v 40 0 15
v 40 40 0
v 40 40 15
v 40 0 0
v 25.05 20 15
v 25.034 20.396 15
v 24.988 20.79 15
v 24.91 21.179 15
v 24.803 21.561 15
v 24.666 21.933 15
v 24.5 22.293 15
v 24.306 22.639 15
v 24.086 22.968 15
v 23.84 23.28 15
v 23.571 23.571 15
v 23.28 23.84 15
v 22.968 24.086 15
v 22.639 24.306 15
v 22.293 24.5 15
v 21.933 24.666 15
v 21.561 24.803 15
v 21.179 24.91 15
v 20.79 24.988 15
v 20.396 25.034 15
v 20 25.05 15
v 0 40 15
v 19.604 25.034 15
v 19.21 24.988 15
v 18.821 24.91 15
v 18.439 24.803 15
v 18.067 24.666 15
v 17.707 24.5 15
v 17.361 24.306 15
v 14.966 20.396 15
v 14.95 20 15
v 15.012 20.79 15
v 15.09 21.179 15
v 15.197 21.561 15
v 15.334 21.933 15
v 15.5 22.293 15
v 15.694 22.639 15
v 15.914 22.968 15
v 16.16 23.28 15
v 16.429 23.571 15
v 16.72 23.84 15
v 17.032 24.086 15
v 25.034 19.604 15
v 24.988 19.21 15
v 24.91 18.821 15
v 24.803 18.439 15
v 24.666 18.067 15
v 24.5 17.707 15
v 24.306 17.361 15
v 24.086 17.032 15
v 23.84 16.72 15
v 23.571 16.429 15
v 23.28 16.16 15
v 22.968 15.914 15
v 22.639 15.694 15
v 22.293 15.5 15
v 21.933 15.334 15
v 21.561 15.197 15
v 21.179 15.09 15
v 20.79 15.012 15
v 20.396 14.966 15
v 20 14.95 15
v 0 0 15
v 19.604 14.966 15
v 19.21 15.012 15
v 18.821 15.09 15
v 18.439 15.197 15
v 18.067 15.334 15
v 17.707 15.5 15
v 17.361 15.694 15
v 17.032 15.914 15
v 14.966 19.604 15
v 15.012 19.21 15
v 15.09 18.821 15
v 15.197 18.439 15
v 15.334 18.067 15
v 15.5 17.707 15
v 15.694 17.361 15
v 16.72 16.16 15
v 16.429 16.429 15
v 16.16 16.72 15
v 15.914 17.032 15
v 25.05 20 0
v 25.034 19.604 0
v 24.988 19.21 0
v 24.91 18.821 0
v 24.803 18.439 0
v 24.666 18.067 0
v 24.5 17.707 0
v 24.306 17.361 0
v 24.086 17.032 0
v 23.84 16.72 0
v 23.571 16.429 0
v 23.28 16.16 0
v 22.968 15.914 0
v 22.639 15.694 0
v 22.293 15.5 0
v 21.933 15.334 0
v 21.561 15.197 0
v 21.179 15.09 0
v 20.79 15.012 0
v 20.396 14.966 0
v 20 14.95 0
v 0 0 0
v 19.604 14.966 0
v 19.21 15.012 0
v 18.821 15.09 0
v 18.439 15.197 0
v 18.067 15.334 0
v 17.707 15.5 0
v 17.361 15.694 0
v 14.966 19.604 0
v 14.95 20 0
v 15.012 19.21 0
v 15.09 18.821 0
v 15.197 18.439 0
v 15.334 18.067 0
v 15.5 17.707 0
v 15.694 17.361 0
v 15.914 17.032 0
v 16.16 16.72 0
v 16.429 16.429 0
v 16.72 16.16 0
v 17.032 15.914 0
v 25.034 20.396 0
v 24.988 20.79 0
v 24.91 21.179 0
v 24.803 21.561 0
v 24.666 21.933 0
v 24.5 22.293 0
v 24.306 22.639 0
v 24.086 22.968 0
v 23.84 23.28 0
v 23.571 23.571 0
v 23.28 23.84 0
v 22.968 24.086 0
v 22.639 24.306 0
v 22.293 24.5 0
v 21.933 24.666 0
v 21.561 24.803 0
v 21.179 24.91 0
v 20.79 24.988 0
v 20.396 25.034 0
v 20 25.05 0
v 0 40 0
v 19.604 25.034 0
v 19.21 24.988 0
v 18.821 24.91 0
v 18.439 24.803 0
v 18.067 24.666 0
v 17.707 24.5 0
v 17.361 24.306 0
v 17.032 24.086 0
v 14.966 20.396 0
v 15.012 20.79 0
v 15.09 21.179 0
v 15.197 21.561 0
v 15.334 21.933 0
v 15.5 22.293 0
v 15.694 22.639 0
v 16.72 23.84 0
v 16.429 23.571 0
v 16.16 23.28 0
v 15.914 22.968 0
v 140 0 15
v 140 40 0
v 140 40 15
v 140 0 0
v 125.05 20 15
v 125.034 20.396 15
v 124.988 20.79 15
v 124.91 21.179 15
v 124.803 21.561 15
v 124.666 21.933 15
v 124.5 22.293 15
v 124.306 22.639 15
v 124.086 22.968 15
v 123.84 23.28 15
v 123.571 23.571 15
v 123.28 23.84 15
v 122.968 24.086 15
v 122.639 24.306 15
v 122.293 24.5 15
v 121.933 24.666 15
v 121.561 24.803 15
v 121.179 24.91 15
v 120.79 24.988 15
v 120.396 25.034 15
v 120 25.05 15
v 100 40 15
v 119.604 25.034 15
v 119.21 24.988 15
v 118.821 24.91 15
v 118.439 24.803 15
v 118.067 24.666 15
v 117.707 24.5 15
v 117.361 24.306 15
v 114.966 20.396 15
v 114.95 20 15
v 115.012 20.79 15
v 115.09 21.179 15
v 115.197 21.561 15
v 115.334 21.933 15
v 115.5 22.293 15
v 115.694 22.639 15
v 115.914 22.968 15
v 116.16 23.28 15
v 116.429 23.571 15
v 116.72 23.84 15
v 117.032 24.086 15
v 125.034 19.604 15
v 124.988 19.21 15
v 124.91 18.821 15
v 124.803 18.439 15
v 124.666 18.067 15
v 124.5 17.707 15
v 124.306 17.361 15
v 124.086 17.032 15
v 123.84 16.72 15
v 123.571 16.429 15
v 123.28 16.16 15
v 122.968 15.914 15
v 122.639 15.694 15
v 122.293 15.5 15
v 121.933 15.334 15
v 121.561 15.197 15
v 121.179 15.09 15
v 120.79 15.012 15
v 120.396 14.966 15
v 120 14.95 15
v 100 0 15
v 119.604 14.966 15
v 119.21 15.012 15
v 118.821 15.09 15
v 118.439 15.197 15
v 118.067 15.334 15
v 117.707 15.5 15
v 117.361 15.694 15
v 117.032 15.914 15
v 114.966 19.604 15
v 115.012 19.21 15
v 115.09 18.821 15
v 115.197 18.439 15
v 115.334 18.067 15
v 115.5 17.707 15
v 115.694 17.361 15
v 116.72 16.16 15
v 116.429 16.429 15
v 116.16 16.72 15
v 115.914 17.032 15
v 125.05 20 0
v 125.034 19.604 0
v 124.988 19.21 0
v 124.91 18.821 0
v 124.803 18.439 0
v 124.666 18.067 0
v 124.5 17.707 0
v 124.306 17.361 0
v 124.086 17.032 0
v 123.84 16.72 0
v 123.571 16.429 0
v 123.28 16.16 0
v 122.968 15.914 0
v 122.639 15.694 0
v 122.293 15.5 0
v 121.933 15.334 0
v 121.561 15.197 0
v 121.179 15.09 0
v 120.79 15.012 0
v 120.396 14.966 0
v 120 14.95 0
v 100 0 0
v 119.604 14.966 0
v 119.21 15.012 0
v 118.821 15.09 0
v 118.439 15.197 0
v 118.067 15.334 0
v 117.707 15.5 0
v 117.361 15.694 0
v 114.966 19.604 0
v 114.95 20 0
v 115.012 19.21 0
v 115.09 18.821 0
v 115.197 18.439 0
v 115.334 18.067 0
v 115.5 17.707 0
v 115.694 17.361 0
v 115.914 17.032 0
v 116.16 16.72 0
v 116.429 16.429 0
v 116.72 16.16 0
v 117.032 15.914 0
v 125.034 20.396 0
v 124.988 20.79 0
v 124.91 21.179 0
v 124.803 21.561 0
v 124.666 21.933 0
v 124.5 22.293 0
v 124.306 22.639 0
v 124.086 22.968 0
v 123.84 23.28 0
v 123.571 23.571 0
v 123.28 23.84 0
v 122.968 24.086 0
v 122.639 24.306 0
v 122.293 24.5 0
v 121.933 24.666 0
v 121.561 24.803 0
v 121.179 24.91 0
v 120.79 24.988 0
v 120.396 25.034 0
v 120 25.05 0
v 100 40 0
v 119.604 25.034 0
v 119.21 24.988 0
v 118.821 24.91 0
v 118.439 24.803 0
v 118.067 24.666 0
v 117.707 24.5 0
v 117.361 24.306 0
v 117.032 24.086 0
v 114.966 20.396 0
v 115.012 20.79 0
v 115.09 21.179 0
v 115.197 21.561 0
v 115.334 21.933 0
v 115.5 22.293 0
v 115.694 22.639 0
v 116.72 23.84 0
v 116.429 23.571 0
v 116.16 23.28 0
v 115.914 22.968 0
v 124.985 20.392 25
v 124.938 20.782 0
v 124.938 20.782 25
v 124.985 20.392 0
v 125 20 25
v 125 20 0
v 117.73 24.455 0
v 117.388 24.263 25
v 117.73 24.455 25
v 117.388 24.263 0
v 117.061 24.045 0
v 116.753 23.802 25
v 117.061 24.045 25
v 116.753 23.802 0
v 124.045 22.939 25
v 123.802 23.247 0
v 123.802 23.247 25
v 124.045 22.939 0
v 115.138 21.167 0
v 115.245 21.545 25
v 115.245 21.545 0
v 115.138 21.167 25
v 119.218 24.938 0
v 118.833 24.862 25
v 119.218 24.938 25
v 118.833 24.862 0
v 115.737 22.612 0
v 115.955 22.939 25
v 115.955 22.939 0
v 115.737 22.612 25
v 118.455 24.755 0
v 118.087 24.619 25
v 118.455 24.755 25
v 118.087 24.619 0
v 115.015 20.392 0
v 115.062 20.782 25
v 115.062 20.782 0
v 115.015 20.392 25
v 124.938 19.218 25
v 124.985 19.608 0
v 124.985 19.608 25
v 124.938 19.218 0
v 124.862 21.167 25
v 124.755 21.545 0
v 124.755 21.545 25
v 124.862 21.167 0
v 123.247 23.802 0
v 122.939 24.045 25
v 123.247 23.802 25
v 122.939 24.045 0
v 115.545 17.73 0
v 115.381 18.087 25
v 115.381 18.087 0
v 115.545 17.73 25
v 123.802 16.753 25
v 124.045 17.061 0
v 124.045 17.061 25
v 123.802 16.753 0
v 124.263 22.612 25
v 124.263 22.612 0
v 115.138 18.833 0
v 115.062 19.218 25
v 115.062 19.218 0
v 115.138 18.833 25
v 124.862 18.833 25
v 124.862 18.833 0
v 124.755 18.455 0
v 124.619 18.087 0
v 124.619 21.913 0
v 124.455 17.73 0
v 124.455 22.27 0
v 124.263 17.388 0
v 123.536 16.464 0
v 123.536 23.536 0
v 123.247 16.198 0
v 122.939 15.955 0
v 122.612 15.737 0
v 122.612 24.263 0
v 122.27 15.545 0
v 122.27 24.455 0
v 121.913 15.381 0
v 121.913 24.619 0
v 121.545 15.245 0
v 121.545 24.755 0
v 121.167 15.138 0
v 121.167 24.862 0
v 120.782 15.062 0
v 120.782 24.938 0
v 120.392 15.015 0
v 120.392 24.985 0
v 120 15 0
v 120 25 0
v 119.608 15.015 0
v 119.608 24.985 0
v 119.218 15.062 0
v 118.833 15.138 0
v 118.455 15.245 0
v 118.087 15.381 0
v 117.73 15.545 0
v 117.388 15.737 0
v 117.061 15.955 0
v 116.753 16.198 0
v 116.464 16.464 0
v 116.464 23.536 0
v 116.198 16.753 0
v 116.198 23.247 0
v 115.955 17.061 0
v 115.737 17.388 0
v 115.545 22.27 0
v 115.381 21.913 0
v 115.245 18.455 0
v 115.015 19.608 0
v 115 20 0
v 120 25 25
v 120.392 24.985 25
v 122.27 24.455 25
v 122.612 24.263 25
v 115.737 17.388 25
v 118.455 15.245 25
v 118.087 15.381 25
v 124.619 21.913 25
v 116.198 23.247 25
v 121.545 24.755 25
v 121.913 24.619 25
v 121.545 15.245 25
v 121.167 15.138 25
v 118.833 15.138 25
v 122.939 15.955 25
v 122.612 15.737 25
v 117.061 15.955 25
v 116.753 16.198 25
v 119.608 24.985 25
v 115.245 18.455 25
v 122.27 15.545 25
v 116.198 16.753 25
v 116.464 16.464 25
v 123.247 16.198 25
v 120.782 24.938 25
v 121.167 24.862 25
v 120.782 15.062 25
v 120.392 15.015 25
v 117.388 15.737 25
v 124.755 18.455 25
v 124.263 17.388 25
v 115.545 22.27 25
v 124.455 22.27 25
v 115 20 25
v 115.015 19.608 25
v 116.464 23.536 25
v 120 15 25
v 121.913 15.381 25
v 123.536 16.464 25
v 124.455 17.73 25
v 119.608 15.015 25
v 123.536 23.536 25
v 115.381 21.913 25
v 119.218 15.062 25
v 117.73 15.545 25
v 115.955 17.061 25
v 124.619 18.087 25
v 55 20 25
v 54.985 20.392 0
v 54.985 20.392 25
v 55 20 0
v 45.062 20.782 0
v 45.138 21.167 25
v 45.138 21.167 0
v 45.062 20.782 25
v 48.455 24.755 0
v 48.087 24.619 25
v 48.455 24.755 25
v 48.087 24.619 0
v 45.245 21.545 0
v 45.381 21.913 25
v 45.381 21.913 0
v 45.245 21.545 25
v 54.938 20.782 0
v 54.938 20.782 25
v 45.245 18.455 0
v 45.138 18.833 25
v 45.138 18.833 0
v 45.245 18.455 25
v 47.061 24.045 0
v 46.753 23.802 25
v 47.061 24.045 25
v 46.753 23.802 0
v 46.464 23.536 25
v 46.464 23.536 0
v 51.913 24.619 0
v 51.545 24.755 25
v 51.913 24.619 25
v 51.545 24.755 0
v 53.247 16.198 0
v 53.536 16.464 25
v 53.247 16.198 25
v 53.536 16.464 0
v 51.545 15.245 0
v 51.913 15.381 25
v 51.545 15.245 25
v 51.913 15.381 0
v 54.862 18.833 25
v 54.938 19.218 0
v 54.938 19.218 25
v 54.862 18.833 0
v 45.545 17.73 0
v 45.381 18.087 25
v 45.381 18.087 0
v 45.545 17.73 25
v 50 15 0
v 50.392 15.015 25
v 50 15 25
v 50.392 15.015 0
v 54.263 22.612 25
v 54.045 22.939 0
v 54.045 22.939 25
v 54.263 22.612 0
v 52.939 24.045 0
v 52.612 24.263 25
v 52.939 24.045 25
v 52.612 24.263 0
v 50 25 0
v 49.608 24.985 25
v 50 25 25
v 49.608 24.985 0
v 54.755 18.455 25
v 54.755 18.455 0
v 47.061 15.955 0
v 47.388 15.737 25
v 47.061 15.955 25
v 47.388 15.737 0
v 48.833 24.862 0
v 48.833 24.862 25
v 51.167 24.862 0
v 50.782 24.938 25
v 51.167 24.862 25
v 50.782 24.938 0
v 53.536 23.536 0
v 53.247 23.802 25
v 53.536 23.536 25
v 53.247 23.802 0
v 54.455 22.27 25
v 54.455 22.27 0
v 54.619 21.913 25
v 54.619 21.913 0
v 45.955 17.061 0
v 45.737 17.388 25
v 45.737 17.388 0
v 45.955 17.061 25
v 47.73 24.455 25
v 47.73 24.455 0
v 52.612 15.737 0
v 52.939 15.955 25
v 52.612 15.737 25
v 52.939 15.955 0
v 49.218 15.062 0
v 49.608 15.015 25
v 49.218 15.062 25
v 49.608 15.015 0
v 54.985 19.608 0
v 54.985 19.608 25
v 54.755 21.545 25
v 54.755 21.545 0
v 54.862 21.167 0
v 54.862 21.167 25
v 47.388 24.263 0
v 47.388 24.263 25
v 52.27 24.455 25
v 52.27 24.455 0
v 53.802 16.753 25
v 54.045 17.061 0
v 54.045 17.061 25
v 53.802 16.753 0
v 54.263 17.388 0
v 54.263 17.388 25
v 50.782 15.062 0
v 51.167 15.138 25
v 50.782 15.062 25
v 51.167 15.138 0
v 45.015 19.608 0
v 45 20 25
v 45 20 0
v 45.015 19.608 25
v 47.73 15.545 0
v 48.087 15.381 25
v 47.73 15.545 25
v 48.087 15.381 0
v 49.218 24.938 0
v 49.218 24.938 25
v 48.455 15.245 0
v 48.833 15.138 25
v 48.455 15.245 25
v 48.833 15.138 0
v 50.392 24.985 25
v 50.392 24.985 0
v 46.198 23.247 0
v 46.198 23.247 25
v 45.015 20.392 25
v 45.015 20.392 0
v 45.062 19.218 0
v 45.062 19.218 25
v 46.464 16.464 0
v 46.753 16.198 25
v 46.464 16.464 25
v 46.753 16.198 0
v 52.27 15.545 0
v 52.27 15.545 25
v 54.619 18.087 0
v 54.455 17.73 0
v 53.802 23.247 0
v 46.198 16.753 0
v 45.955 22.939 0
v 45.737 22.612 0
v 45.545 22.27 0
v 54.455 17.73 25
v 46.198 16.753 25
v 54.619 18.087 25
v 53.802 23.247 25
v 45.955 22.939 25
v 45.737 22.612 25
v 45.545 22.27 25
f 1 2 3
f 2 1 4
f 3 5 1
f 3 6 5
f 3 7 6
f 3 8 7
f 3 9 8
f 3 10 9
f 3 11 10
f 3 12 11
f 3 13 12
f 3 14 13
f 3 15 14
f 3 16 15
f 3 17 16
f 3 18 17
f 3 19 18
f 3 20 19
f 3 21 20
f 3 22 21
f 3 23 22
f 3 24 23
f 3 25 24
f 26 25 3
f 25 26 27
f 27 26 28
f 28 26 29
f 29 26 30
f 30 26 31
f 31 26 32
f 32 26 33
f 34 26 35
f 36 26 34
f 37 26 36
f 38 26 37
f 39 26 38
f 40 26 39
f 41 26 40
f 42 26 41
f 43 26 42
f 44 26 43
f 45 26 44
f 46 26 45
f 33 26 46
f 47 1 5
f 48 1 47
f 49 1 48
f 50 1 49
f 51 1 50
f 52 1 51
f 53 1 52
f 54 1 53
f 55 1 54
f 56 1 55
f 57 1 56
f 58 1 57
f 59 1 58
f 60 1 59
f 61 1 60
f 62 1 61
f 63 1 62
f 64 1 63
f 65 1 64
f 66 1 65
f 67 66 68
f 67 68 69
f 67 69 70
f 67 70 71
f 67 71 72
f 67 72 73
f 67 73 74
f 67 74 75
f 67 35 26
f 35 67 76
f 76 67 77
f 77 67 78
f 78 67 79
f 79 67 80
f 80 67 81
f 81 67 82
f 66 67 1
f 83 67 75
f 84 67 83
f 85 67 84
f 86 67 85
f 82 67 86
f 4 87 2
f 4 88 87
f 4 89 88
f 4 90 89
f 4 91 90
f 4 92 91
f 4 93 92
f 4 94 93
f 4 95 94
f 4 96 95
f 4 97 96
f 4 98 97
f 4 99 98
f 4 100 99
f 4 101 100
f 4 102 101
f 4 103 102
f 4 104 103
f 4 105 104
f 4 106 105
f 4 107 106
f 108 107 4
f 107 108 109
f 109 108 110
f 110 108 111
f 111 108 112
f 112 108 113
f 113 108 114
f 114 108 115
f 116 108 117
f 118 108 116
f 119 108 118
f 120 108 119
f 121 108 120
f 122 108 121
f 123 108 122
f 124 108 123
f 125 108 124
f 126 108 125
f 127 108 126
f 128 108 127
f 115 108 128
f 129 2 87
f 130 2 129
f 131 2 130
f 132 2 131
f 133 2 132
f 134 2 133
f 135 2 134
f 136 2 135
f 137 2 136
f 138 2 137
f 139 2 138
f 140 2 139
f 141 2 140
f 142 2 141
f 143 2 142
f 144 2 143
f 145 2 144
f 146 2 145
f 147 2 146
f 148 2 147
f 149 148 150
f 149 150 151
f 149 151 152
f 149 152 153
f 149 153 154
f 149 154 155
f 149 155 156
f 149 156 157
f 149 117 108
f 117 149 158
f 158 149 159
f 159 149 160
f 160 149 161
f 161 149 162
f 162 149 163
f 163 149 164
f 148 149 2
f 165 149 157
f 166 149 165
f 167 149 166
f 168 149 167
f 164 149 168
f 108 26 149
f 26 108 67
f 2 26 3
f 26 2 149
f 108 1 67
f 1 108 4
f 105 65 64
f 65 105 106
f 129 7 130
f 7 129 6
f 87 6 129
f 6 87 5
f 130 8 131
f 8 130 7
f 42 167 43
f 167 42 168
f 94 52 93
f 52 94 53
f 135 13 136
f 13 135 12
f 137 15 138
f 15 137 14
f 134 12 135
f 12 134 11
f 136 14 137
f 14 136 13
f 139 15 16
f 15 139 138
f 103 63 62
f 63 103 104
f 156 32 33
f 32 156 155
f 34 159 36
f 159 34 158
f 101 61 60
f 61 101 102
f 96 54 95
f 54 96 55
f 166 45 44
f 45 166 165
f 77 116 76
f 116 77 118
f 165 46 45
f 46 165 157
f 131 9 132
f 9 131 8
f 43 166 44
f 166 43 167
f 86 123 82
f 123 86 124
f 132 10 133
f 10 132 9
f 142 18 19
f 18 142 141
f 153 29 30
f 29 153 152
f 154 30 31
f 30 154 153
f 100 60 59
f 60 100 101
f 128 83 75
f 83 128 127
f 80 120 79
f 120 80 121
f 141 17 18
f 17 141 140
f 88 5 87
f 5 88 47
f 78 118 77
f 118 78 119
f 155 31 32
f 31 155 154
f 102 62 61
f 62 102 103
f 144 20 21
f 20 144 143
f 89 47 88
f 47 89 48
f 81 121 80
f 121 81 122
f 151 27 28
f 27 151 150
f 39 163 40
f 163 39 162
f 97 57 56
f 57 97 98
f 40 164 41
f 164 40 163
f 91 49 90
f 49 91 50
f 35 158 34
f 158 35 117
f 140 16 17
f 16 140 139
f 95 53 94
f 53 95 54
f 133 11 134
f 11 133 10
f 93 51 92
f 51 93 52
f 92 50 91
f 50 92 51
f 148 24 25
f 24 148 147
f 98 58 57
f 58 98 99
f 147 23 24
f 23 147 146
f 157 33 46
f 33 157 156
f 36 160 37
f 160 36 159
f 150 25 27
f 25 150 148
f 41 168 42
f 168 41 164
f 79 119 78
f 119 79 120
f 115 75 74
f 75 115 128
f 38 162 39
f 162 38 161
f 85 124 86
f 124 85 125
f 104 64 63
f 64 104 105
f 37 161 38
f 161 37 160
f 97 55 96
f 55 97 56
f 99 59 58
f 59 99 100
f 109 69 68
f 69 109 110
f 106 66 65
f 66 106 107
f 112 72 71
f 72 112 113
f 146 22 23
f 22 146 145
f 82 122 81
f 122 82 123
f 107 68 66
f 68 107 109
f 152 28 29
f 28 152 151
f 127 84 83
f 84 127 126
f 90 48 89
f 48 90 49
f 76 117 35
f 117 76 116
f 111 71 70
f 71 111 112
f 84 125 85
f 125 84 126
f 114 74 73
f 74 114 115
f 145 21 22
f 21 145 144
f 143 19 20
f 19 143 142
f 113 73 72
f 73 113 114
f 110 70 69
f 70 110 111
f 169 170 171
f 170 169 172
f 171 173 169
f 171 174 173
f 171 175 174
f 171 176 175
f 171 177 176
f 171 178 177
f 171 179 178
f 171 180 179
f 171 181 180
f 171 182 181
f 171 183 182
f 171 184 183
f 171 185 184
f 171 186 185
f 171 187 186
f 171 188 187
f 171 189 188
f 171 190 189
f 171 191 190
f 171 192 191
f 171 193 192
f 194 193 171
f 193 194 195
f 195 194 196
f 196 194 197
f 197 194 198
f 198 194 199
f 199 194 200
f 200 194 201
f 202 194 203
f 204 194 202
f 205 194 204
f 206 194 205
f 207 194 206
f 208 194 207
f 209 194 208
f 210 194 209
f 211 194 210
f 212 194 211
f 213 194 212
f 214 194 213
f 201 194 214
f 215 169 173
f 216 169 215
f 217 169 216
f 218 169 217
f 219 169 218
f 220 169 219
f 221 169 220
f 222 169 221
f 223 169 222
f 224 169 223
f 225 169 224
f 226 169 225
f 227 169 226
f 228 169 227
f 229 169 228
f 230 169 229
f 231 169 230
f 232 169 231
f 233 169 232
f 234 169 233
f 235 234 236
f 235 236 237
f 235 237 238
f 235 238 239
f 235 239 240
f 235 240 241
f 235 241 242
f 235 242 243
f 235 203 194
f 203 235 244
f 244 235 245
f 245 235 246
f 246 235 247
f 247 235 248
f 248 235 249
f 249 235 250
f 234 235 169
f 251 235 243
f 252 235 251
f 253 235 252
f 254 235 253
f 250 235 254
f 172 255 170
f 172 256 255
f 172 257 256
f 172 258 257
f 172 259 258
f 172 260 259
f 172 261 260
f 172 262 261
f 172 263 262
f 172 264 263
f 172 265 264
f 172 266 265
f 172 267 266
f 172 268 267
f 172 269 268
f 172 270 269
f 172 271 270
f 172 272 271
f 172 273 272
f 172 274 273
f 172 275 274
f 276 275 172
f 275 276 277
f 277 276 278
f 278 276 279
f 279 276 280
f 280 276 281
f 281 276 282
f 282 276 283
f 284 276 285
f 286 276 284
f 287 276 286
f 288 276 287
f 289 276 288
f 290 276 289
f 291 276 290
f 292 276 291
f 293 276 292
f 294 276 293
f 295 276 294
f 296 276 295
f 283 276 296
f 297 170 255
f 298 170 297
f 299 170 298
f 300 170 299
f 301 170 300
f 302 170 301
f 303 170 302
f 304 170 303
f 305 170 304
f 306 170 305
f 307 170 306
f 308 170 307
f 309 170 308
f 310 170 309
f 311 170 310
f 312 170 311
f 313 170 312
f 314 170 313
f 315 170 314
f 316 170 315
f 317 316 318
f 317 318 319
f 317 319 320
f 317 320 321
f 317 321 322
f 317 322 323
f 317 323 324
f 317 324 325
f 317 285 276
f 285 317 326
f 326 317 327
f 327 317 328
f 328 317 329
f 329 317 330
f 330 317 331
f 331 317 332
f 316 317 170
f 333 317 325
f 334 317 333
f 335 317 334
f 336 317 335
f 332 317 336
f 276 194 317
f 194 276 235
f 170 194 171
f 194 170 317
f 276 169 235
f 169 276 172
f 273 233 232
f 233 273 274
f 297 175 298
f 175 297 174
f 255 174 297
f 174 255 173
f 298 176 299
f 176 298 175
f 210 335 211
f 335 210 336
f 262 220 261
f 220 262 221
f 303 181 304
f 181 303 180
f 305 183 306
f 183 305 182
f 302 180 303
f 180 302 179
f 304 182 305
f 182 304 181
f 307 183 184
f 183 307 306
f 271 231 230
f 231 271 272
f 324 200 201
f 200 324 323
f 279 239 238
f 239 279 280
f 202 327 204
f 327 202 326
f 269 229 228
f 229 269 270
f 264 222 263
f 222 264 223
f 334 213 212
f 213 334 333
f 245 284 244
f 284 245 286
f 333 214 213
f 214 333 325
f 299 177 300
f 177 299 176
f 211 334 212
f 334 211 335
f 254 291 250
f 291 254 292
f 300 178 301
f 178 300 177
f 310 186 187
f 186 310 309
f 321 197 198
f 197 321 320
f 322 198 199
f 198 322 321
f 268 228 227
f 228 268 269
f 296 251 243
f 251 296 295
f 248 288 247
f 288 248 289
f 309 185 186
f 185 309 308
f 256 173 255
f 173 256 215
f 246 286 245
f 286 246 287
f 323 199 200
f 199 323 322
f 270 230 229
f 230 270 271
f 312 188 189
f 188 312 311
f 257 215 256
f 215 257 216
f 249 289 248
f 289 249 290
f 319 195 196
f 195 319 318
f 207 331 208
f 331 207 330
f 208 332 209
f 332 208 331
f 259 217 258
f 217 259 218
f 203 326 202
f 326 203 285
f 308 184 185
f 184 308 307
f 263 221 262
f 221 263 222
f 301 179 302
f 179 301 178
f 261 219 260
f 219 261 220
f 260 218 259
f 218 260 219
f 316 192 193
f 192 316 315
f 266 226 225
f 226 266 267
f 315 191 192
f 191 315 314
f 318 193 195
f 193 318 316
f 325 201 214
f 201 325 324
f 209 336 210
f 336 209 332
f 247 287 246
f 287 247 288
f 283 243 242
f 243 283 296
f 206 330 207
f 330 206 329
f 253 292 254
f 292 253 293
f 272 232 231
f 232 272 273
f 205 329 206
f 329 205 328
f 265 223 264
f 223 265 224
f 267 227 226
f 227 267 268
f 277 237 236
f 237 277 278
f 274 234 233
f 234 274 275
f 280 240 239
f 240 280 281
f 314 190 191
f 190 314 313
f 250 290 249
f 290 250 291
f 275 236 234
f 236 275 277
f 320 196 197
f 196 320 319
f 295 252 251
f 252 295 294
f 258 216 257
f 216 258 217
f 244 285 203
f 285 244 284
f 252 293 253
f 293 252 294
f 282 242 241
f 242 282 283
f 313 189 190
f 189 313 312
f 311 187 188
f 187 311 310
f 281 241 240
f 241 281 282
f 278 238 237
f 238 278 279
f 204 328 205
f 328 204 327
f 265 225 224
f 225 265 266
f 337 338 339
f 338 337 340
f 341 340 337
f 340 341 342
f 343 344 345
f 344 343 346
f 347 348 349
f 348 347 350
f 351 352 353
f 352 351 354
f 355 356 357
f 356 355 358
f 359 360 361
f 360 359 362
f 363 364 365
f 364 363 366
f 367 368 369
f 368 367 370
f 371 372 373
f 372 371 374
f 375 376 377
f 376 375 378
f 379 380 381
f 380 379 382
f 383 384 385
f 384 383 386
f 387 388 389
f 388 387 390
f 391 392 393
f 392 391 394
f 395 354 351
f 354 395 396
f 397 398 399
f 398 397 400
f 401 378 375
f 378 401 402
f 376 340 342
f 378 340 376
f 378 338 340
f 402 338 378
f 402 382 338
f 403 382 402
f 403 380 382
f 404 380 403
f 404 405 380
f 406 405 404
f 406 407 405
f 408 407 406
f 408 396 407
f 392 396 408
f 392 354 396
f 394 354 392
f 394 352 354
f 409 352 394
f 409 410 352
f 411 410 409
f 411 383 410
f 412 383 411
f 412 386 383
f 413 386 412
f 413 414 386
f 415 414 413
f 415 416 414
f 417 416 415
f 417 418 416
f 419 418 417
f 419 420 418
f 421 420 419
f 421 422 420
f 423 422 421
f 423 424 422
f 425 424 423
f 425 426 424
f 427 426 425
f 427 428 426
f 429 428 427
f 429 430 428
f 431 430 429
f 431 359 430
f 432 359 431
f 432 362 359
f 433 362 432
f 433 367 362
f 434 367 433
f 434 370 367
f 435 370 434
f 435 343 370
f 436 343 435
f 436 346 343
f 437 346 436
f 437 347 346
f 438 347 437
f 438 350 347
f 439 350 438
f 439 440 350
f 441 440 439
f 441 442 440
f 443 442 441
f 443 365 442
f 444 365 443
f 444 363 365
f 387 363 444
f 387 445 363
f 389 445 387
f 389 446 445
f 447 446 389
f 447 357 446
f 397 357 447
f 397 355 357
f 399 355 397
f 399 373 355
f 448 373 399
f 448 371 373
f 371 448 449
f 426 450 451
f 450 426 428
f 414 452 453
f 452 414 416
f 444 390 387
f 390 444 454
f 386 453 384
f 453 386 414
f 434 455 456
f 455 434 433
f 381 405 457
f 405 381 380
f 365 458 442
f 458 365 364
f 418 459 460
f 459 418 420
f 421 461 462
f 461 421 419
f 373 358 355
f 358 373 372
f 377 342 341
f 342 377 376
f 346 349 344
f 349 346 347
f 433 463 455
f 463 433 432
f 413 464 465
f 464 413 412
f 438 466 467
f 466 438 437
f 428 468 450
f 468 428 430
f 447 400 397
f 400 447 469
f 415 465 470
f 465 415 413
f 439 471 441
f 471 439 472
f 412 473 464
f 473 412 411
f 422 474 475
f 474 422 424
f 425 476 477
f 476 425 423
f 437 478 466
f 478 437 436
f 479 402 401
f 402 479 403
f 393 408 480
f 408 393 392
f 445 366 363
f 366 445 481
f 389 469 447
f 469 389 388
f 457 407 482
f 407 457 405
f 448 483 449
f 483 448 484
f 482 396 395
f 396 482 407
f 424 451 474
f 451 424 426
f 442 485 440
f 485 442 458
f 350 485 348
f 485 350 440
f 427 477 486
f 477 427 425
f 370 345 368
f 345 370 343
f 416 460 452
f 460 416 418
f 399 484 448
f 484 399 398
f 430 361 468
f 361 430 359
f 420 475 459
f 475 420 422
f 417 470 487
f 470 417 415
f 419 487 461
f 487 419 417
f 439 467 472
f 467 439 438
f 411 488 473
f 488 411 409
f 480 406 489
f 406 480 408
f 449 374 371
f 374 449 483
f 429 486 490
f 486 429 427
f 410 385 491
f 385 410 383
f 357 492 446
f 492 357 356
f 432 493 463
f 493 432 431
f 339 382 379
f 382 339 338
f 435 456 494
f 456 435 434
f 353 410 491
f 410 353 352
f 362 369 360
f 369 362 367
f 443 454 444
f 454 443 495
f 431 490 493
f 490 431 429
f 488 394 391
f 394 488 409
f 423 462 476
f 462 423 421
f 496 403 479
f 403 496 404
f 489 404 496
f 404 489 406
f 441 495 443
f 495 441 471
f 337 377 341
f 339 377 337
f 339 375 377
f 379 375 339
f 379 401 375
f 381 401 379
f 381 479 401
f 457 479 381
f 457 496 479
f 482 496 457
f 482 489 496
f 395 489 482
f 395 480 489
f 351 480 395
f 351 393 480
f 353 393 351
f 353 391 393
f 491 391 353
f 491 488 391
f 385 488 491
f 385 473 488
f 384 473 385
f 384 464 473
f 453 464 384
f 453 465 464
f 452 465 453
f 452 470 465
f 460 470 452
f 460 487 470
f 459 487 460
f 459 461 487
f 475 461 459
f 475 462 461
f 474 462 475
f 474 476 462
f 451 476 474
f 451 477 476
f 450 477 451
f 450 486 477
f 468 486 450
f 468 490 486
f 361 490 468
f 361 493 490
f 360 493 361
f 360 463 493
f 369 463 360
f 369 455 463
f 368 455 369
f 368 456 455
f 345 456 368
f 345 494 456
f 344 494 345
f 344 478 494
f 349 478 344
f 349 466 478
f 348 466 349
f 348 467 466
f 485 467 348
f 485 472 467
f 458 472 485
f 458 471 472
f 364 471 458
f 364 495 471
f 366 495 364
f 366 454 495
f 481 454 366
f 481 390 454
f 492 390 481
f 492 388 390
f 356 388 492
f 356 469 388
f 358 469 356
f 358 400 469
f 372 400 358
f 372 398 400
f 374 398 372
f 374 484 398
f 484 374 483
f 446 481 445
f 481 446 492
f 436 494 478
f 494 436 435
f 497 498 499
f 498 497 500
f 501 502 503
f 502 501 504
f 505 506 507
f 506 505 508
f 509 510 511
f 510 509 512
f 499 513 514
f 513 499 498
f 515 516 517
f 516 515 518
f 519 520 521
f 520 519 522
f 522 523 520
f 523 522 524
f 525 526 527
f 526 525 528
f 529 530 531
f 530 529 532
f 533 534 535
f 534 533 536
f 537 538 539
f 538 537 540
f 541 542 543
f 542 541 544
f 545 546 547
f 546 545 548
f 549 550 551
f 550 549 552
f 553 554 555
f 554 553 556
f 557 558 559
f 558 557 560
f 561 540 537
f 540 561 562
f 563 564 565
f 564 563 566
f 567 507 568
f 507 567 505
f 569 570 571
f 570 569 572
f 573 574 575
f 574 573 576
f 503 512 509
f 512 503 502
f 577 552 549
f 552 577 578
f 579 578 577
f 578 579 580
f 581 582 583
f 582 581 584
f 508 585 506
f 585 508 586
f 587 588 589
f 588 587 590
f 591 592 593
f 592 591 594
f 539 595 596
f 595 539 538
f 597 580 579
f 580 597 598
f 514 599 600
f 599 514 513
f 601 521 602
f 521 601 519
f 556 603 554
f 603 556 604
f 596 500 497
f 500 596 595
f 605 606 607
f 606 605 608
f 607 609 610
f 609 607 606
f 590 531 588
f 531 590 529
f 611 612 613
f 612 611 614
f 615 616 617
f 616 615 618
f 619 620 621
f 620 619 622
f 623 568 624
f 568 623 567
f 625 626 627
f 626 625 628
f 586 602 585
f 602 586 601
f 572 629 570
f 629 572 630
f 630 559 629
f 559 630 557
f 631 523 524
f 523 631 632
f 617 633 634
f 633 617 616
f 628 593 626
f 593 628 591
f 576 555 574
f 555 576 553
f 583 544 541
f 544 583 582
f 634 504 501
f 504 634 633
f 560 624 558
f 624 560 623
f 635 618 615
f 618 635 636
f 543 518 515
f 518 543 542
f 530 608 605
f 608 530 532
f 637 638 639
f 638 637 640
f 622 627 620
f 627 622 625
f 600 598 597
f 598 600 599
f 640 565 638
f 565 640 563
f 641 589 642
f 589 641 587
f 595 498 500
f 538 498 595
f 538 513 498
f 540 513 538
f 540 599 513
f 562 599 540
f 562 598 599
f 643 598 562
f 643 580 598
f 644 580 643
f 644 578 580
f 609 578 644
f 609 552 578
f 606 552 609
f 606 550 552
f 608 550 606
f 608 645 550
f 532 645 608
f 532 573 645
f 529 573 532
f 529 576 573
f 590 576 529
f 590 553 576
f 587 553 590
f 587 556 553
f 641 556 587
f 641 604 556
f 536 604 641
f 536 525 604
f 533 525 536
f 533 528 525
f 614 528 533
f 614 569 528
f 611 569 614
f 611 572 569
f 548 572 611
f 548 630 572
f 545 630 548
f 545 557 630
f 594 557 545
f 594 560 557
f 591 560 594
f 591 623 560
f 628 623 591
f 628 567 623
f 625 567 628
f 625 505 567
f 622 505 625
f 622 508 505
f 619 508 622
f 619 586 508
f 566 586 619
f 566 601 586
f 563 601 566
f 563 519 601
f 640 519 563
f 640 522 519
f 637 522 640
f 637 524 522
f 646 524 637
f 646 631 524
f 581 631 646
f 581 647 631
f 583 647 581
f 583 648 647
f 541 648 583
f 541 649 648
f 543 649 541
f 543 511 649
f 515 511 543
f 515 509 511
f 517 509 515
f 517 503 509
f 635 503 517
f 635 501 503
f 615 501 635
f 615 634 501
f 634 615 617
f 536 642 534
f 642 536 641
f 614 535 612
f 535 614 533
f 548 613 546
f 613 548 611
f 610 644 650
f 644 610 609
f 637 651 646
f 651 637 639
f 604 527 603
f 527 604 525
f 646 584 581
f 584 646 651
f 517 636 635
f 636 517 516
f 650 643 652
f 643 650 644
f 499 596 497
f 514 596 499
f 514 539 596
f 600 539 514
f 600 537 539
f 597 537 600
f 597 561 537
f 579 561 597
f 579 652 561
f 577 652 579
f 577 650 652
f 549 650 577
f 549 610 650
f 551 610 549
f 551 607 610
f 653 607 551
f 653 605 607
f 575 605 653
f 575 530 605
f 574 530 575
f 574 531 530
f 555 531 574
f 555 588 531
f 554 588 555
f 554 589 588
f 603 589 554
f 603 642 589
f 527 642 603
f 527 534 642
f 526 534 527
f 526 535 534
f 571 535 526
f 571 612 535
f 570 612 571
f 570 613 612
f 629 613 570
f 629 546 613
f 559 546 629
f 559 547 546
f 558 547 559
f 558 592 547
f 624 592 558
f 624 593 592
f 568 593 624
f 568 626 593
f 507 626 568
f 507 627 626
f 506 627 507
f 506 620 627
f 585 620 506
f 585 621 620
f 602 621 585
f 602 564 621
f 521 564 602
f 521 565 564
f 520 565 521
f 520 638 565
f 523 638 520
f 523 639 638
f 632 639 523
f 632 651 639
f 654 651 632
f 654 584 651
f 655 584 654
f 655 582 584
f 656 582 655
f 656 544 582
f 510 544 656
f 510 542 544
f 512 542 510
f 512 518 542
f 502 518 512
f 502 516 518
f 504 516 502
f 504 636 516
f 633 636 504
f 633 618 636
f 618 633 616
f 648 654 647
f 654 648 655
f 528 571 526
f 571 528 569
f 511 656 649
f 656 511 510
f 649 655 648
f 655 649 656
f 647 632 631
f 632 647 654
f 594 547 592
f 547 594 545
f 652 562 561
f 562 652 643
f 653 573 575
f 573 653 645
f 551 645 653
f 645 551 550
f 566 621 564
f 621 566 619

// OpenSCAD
// Peg-in-Hole Example: Cylinder slides into Cube
// This demonstrates clearance for interlocking parts

$fn = 80                                  ;  // Smooth preview

// === DESIGN PARAMETERS ===

// The peg (cylinder) dimensions
peg_diameter = 10.0;   // 10mm cylinder that will slide into hole
peg_height = 25;       // 25mm tall

// Clearance for sliding fit
sliding_clearance = 0.1;  // 0.3mm gap (0.15mm per side)

// Calculate hole size (needs to be bigger than peg!)
hole_diameter = peg_diameter + sliding_clearance;
// Result: 10.3mm hole for 10.0mm peg


// === PART 1: THE CUBE WITH HOLE ===

difference() {
    // Main cube
    cube([40, 40, 15]);  // 40mm × 40mm × 15mm tall
    
    // Hole for cylinder to slide into
    // Position hole at center of cube
    translate([20, 20, -1])  // Center: half of 40mm, half of 40mm
        cylinder(h=17, r=hole_diameter/2);  // 10.3mm diameter hole
}


// === PART 2: THE CYLINDER PEG ===

// Position it next to the cube so you can see both parts
translate([50, 20, 0]) {  // Move it 50mm to the right
    
    color("lightblue")  // Color it so it's easy to distinguish
        cylinder(h=peg_height, r=peg_diameter/2);  // Exact 10.0mm peg
}


// === PART 3: ASSEMBLED VIEW ===

// Show how they fit together (further to the right)
translate([100, 0, 0]) {  // Move assembly 100mm right
    
    // The cube with hole
    difference() {
        cube([40, 40, 15]);
        translate([20, 20, -1])
            cylinder(h=17, r=hole_diameter/2);
    }
    
    // The peg inserted into the hole
    translate([20, 20, 0])  // Position at hole center
        color("lightblue")
            cylinder(h=peg_height, r=peg_diameter/2);
    
    // Note: Peg sticks out 10mm above cube (25mm - 15mm)
}


// === VISUAL GUIDE ===

// Add text labels (these won't print, just for visualization)
translate([5, -5, 0])
    color("black")
        text("Cube with Hole", size=4);

translate([50, -5, 0])
    color("black")
        text("Cylinder Peg", size=4);

translate([100, -5, 0])
    color("black")
        text("Assembled", size=4);


// === MEASUREMENTS ===
// Peg diameter: 10.0mm
// Hole diameter: 10.3mm
// Clearance: 0.3mm total (0.15mm gap on each side)
// 
// This 0.3mm clearance allows:
// - Smooth sliding assembly
// - Accounts for printer tolerance (±0.1mm)
// - No binding or forcing needed


// === EXERCISES ===
// 1. Change sliding_clearance to 0.1 - tighter fit
// 2. Change sliding_clearance to 0.5 - looser fit  
// 3. Change peg_diameter to 8.0 - everything scales!
// 4. Make peg_height = 12 to see it NOT stick out above cube
